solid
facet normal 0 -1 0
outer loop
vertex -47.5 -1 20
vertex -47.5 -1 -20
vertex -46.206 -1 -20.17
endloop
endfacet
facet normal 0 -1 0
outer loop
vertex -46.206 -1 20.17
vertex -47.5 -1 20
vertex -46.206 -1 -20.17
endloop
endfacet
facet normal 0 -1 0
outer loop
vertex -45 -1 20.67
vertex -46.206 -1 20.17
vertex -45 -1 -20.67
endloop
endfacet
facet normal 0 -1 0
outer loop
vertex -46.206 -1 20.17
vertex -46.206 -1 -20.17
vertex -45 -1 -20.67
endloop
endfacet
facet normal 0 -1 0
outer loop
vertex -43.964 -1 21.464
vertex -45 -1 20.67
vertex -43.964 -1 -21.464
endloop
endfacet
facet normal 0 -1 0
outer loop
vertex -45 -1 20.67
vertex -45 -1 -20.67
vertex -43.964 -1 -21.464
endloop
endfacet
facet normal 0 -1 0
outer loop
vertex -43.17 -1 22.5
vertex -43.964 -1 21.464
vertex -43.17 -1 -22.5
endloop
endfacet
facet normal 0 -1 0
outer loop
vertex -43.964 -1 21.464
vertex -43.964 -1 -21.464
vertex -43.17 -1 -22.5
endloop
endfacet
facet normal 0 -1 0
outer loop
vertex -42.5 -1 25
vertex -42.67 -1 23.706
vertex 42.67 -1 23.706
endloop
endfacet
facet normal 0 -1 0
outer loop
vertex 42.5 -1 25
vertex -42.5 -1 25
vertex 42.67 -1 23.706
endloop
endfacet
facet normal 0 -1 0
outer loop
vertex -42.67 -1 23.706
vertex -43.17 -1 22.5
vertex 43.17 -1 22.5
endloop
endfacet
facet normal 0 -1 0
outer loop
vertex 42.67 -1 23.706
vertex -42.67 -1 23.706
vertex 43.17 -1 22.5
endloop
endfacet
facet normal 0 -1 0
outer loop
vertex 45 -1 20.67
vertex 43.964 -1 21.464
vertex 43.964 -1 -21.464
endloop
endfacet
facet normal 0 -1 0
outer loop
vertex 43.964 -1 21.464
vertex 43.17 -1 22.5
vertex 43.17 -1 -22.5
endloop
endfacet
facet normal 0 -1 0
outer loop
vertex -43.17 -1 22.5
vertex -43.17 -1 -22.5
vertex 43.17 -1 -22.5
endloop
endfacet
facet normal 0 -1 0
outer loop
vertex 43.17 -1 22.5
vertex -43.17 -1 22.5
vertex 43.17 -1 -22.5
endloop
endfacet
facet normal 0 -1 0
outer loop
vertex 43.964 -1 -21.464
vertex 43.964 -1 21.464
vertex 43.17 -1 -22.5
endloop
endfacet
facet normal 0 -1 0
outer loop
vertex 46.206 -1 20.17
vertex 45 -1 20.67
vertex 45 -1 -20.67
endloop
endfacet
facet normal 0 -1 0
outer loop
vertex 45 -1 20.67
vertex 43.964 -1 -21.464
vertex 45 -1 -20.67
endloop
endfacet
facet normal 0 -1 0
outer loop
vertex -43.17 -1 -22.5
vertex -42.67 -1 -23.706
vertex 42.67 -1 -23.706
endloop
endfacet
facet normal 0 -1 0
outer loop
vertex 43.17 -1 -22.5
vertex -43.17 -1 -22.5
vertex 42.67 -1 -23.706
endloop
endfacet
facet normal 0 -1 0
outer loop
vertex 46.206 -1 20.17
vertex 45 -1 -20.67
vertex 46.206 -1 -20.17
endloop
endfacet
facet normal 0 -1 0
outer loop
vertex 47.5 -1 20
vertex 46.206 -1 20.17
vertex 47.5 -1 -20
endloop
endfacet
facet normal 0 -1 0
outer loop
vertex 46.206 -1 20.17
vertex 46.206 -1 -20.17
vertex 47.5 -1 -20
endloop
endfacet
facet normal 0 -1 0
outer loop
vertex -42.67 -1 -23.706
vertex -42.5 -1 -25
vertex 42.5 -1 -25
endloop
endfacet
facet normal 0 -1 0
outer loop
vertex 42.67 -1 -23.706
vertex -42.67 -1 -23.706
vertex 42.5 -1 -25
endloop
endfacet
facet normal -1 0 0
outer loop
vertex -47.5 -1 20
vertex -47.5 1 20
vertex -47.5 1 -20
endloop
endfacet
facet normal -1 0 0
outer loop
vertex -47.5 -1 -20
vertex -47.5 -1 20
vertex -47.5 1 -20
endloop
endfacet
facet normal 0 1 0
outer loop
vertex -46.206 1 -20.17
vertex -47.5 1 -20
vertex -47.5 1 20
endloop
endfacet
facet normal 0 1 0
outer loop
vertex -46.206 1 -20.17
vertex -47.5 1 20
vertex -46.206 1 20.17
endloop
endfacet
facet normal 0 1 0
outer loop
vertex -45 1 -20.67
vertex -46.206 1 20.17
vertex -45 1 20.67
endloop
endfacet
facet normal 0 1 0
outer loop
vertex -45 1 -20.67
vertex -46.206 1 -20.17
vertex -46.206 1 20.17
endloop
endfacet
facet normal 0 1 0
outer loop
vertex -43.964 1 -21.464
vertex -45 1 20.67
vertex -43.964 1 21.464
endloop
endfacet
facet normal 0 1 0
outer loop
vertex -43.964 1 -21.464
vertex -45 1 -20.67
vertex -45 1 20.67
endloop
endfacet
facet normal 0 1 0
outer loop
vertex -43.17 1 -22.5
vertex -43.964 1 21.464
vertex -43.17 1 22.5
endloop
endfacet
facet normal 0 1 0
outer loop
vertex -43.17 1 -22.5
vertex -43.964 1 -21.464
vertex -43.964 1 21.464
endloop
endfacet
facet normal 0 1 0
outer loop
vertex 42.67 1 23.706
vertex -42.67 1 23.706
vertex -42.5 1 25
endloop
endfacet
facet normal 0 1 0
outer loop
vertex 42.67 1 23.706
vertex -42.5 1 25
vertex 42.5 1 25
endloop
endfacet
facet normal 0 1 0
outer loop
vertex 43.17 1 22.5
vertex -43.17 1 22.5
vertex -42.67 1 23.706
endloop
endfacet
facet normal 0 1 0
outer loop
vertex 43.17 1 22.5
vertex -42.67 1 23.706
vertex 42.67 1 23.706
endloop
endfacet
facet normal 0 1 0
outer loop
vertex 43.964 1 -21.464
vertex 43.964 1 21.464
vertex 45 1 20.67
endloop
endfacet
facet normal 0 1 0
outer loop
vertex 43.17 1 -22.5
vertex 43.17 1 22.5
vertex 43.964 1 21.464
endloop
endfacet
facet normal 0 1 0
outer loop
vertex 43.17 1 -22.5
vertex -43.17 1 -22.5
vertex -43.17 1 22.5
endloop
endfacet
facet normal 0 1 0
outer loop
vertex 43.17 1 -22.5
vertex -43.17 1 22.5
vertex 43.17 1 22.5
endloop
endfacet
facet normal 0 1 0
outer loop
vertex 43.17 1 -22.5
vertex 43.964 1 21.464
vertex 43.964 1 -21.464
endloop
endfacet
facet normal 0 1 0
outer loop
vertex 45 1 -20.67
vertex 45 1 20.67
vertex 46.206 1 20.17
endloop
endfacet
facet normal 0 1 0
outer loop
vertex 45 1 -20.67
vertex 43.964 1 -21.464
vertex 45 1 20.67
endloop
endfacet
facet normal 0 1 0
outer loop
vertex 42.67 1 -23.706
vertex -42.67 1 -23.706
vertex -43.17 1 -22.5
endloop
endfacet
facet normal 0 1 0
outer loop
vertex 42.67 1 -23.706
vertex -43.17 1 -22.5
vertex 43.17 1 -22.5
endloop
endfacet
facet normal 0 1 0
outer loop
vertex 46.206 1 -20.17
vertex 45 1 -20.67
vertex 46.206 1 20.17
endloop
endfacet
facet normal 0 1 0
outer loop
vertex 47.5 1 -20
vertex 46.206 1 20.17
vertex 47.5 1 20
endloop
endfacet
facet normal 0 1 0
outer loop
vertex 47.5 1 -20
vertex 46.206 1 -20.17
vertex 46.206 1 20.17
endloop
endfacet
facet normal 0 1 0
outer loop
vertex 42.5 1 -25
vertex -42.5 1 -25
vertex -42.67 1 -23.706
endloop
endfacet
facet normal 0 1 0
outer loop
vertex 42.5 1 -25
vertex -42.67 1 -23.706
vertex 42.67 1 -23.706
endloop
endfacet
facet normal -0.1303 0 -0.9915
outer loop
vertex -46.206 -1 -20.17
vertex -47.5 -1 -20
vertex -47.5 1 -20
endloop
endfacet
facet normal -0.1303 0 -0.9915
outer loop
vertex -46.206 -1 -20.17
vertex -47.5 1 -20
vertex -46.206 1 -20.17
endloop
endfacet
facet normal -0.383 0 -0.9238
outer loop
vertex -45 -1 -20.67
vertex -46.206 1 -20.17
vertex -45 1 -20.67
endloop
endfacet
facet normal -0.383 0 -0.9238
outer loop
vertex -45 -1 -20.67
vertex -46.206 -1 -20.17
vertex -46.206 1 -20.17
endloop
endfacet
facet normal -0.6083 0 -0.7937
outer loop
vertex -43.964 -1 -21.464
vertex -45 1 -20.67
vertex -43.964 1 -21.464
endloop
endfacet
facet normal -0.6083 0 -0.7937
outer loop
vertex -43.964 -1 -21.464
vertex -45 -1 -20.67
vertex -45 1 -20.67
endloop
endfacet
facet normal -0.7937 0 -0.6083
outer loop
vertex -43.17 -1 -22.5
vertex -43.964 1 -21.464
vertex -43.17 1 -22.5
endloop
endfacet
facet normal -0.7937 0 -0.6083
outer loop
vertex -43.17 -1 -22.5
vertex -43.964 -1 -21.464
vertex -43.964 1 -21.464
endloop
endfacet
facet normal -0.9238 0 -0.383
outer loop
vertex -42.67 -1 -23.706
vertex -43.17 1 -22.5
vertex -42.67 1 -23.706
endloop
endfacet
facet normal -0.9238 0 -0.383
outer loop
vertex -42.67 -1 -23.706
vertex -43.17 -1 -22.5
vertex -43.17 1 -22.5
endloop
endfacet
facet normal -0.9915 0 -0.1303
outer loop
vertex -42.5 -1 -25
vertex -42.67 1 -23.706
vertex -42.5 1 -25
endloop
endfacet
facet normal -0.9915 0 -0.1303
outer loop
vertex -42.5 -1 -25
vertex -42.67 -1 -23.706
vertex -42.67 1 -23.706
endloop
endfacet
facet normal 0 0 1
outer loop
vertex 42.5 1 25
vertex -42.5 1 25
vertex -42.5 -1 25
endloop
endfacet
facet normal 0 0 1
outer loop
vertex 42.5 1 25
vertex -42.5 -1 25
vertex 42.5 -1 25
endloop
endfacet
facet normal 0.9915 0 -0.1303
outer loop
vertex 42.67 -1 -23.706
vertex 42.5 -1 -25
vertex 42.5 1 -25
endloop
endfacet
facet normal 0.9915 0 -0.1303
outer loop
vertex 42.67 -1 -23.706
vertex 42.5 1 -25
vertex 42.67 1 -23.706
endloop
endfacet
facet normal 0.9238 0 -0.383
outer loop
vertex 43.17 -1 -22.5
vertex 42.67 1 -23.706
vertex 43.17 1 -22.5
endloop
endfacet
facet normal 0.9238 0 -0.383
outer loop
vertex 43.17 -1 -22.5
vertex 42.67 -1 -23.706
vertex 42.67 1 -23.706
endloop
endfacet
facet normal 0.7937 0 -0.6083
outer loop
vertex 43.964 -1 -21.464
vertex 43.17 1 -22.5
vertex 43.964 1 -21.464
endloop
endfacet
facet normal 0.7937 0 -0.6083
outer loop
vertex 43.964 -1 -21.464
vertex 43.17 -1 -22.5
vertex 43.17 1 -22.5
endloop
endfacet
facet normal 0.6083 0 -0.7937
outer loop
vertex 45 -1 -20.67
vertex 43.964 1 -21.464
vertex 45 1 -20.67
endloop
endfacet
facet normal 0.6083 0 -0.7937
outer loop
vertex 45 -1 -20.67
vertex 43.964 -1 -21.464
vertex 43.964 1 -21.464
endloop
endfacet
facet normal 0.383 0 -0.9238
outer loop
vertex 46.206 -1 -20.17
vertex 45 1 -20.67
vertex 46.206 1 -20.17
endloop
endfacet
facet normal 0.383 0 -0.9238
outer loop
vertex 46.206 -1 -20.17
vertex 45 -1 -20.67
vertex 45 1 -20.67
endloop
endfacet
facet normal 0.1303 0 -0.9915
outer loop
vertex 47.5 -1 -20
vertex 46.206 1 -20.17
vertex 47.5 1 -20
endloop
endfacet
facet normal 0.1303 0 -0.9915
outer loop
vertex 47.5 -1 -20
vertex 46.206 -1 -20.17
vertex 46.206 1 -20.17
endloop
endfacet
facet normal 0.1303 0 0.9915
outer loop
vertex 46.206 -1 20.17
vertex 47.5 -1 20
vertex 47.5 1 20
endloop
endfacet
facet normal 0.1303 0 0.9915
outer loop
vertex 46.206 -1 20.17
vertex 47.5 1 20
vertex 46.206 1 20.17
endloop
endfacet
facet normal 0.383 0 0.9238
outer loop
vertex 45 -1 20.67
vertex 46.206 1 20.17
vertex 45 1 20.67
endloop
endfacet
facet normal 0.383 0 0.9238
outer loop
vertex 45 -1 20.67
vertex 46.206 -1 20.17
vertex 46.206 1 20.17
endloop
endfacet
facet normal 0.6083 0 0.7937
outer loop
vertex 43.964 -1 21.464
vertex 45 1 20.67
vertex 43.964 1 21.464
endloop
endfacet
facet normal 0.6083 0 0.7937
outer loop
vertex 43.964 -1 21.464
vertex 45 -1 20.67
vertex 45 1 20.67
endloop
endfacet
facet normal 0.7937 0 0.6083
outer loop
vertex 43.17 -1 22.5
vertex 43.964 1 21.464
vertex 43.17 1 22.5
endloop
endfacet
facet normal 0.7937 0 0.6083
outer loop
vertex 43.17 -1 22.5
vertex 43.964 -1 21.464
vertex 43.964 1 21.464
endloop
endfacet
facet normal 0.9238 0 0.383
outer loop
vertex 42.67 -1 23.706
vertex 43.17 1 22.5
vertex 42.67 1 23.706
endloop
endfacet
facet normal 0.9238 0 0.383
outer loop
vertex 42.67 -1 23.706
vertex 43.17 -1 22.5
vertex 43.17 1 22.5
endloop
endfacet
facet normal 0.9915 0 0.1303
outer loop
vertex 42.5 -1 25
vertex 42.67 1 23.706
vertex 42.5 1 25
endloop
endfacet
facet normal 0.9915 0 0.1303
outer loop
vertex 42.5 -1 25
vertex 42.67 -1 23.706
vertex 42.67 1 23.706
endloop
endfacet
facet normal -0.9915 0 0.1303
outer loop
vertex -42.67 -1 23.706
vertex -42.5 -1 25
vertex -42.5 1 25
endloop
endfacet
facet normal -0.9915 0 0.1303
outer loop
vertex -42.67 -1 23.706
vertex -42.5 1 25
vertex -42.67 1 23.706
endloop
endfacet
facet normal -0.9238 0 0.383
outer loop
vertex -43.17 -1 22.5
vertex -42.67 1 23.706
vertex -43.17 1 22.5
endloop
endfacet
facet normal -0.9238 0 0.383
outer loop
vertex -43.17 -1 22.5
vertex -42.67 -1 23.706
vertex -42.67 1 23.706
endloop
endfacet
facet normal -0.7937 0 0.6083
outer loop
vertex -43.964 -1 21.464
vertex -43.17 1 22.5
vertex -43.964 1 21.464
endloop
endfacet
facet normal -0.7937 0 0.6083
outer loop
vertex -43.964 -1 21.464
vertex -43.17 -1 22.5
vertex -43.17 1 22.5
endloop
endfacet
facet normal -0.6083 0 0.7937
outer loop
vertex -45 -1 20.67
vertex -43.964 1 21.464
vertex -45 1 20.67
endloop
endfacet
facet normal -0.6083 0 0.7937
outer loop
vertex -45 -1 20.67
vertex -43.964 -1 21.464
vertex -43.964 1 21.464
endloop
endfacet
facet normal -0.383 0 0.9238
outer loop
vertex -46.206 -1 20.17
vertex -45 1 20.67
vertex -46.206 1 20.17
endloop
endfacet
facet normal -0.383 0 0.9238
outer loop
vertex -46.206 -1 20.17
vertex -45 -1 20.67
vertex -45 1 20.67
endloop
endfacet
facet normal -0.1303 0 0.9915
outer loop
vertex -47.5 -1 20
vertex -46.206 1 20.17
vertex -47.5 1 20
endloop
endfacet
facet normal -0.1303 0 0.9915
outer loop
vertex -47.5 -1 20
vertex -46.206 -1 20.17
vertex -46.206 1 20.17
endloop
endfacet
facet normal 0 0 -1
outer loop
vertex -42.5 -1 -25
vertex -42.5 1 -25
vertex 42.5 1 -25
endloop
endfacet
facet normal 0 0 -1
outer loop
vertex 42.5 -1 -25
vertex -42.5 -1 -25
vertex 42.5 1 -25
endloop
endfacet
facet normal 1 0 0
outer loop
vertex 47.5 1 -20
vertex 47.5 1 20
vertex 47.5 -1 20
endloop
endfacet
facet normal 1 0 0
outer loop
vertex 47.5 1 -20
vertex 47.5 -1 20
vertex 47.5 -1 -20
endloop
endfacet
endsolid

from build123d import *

# Parameters (mm, degrees)
SKETCH1_W           = 95
SKETCH1_H           = 50
BOSS_EXTRUDE1_DEPTH = 1
CAVITY1_START       = -1
CAVITY1_DEPTH       = 2


# Read off the part's stored shape, not the designer's step: Cavity1
with BuildPart() as part:
    # Sketch1 → Boss-Extrude1 (new, symmetric)
    with BuildSketch(Plane(origin=(0, 0, 0), x_dir=(1, 0, 0), z_dir=(0, 1, 0))):
        Rectangle(SKETCH1_W, SKETCH1_H)
    extrude(amount=BOSS_EXTRUDE1_DEPTH, both=True)

    # Cavity1 outline → Cavity1 (cut)
    with BuildSketch(Plane(origin=(0, 0, 0), x_dir=(1, 0, 0), z_dir=(0, 1, 0)).offset(CAVITY1_START)):
        with BuildLine():
            Line((47.5, -25), (47.5, -20))
            ThreePointArc((47.5, -20), (43.964466094, -21.464466094), (42.5, -25))
            Line((42.5, -25), (47.5, -25))
        make_face()
        with BuildLine():
            ThreePointArc((42.5, 25), (43.964466094, 21.464466094), (47.5, 20))
            Line((47.5, 20), (47.5, 25))
            Line((47.5, 25), (42.5, 25))
        make_face()
        with BuildLine():
            Line((-47.5, -25), (-42.5, -25))
            ThreePointArc((-42.5, -25), (-43.964466094, -21.464466094), (-47.5, -20))
            Line((-47.5, -20), (-47.5, -25))
        make_face()
        with BuildLine():
            ThreePointArc((-47.5, 20), (-43.964466094, 21.464466094), (-42.5, 25))
            Line((-42.5, 25), (-47.5, 25))
            Line((-47.5, 25), (-47.5, 20))
        make_face()
    extrude(amount=CAVITY1_DEPTH, mode=Mode.SUBTRACT)


solid = part.part
